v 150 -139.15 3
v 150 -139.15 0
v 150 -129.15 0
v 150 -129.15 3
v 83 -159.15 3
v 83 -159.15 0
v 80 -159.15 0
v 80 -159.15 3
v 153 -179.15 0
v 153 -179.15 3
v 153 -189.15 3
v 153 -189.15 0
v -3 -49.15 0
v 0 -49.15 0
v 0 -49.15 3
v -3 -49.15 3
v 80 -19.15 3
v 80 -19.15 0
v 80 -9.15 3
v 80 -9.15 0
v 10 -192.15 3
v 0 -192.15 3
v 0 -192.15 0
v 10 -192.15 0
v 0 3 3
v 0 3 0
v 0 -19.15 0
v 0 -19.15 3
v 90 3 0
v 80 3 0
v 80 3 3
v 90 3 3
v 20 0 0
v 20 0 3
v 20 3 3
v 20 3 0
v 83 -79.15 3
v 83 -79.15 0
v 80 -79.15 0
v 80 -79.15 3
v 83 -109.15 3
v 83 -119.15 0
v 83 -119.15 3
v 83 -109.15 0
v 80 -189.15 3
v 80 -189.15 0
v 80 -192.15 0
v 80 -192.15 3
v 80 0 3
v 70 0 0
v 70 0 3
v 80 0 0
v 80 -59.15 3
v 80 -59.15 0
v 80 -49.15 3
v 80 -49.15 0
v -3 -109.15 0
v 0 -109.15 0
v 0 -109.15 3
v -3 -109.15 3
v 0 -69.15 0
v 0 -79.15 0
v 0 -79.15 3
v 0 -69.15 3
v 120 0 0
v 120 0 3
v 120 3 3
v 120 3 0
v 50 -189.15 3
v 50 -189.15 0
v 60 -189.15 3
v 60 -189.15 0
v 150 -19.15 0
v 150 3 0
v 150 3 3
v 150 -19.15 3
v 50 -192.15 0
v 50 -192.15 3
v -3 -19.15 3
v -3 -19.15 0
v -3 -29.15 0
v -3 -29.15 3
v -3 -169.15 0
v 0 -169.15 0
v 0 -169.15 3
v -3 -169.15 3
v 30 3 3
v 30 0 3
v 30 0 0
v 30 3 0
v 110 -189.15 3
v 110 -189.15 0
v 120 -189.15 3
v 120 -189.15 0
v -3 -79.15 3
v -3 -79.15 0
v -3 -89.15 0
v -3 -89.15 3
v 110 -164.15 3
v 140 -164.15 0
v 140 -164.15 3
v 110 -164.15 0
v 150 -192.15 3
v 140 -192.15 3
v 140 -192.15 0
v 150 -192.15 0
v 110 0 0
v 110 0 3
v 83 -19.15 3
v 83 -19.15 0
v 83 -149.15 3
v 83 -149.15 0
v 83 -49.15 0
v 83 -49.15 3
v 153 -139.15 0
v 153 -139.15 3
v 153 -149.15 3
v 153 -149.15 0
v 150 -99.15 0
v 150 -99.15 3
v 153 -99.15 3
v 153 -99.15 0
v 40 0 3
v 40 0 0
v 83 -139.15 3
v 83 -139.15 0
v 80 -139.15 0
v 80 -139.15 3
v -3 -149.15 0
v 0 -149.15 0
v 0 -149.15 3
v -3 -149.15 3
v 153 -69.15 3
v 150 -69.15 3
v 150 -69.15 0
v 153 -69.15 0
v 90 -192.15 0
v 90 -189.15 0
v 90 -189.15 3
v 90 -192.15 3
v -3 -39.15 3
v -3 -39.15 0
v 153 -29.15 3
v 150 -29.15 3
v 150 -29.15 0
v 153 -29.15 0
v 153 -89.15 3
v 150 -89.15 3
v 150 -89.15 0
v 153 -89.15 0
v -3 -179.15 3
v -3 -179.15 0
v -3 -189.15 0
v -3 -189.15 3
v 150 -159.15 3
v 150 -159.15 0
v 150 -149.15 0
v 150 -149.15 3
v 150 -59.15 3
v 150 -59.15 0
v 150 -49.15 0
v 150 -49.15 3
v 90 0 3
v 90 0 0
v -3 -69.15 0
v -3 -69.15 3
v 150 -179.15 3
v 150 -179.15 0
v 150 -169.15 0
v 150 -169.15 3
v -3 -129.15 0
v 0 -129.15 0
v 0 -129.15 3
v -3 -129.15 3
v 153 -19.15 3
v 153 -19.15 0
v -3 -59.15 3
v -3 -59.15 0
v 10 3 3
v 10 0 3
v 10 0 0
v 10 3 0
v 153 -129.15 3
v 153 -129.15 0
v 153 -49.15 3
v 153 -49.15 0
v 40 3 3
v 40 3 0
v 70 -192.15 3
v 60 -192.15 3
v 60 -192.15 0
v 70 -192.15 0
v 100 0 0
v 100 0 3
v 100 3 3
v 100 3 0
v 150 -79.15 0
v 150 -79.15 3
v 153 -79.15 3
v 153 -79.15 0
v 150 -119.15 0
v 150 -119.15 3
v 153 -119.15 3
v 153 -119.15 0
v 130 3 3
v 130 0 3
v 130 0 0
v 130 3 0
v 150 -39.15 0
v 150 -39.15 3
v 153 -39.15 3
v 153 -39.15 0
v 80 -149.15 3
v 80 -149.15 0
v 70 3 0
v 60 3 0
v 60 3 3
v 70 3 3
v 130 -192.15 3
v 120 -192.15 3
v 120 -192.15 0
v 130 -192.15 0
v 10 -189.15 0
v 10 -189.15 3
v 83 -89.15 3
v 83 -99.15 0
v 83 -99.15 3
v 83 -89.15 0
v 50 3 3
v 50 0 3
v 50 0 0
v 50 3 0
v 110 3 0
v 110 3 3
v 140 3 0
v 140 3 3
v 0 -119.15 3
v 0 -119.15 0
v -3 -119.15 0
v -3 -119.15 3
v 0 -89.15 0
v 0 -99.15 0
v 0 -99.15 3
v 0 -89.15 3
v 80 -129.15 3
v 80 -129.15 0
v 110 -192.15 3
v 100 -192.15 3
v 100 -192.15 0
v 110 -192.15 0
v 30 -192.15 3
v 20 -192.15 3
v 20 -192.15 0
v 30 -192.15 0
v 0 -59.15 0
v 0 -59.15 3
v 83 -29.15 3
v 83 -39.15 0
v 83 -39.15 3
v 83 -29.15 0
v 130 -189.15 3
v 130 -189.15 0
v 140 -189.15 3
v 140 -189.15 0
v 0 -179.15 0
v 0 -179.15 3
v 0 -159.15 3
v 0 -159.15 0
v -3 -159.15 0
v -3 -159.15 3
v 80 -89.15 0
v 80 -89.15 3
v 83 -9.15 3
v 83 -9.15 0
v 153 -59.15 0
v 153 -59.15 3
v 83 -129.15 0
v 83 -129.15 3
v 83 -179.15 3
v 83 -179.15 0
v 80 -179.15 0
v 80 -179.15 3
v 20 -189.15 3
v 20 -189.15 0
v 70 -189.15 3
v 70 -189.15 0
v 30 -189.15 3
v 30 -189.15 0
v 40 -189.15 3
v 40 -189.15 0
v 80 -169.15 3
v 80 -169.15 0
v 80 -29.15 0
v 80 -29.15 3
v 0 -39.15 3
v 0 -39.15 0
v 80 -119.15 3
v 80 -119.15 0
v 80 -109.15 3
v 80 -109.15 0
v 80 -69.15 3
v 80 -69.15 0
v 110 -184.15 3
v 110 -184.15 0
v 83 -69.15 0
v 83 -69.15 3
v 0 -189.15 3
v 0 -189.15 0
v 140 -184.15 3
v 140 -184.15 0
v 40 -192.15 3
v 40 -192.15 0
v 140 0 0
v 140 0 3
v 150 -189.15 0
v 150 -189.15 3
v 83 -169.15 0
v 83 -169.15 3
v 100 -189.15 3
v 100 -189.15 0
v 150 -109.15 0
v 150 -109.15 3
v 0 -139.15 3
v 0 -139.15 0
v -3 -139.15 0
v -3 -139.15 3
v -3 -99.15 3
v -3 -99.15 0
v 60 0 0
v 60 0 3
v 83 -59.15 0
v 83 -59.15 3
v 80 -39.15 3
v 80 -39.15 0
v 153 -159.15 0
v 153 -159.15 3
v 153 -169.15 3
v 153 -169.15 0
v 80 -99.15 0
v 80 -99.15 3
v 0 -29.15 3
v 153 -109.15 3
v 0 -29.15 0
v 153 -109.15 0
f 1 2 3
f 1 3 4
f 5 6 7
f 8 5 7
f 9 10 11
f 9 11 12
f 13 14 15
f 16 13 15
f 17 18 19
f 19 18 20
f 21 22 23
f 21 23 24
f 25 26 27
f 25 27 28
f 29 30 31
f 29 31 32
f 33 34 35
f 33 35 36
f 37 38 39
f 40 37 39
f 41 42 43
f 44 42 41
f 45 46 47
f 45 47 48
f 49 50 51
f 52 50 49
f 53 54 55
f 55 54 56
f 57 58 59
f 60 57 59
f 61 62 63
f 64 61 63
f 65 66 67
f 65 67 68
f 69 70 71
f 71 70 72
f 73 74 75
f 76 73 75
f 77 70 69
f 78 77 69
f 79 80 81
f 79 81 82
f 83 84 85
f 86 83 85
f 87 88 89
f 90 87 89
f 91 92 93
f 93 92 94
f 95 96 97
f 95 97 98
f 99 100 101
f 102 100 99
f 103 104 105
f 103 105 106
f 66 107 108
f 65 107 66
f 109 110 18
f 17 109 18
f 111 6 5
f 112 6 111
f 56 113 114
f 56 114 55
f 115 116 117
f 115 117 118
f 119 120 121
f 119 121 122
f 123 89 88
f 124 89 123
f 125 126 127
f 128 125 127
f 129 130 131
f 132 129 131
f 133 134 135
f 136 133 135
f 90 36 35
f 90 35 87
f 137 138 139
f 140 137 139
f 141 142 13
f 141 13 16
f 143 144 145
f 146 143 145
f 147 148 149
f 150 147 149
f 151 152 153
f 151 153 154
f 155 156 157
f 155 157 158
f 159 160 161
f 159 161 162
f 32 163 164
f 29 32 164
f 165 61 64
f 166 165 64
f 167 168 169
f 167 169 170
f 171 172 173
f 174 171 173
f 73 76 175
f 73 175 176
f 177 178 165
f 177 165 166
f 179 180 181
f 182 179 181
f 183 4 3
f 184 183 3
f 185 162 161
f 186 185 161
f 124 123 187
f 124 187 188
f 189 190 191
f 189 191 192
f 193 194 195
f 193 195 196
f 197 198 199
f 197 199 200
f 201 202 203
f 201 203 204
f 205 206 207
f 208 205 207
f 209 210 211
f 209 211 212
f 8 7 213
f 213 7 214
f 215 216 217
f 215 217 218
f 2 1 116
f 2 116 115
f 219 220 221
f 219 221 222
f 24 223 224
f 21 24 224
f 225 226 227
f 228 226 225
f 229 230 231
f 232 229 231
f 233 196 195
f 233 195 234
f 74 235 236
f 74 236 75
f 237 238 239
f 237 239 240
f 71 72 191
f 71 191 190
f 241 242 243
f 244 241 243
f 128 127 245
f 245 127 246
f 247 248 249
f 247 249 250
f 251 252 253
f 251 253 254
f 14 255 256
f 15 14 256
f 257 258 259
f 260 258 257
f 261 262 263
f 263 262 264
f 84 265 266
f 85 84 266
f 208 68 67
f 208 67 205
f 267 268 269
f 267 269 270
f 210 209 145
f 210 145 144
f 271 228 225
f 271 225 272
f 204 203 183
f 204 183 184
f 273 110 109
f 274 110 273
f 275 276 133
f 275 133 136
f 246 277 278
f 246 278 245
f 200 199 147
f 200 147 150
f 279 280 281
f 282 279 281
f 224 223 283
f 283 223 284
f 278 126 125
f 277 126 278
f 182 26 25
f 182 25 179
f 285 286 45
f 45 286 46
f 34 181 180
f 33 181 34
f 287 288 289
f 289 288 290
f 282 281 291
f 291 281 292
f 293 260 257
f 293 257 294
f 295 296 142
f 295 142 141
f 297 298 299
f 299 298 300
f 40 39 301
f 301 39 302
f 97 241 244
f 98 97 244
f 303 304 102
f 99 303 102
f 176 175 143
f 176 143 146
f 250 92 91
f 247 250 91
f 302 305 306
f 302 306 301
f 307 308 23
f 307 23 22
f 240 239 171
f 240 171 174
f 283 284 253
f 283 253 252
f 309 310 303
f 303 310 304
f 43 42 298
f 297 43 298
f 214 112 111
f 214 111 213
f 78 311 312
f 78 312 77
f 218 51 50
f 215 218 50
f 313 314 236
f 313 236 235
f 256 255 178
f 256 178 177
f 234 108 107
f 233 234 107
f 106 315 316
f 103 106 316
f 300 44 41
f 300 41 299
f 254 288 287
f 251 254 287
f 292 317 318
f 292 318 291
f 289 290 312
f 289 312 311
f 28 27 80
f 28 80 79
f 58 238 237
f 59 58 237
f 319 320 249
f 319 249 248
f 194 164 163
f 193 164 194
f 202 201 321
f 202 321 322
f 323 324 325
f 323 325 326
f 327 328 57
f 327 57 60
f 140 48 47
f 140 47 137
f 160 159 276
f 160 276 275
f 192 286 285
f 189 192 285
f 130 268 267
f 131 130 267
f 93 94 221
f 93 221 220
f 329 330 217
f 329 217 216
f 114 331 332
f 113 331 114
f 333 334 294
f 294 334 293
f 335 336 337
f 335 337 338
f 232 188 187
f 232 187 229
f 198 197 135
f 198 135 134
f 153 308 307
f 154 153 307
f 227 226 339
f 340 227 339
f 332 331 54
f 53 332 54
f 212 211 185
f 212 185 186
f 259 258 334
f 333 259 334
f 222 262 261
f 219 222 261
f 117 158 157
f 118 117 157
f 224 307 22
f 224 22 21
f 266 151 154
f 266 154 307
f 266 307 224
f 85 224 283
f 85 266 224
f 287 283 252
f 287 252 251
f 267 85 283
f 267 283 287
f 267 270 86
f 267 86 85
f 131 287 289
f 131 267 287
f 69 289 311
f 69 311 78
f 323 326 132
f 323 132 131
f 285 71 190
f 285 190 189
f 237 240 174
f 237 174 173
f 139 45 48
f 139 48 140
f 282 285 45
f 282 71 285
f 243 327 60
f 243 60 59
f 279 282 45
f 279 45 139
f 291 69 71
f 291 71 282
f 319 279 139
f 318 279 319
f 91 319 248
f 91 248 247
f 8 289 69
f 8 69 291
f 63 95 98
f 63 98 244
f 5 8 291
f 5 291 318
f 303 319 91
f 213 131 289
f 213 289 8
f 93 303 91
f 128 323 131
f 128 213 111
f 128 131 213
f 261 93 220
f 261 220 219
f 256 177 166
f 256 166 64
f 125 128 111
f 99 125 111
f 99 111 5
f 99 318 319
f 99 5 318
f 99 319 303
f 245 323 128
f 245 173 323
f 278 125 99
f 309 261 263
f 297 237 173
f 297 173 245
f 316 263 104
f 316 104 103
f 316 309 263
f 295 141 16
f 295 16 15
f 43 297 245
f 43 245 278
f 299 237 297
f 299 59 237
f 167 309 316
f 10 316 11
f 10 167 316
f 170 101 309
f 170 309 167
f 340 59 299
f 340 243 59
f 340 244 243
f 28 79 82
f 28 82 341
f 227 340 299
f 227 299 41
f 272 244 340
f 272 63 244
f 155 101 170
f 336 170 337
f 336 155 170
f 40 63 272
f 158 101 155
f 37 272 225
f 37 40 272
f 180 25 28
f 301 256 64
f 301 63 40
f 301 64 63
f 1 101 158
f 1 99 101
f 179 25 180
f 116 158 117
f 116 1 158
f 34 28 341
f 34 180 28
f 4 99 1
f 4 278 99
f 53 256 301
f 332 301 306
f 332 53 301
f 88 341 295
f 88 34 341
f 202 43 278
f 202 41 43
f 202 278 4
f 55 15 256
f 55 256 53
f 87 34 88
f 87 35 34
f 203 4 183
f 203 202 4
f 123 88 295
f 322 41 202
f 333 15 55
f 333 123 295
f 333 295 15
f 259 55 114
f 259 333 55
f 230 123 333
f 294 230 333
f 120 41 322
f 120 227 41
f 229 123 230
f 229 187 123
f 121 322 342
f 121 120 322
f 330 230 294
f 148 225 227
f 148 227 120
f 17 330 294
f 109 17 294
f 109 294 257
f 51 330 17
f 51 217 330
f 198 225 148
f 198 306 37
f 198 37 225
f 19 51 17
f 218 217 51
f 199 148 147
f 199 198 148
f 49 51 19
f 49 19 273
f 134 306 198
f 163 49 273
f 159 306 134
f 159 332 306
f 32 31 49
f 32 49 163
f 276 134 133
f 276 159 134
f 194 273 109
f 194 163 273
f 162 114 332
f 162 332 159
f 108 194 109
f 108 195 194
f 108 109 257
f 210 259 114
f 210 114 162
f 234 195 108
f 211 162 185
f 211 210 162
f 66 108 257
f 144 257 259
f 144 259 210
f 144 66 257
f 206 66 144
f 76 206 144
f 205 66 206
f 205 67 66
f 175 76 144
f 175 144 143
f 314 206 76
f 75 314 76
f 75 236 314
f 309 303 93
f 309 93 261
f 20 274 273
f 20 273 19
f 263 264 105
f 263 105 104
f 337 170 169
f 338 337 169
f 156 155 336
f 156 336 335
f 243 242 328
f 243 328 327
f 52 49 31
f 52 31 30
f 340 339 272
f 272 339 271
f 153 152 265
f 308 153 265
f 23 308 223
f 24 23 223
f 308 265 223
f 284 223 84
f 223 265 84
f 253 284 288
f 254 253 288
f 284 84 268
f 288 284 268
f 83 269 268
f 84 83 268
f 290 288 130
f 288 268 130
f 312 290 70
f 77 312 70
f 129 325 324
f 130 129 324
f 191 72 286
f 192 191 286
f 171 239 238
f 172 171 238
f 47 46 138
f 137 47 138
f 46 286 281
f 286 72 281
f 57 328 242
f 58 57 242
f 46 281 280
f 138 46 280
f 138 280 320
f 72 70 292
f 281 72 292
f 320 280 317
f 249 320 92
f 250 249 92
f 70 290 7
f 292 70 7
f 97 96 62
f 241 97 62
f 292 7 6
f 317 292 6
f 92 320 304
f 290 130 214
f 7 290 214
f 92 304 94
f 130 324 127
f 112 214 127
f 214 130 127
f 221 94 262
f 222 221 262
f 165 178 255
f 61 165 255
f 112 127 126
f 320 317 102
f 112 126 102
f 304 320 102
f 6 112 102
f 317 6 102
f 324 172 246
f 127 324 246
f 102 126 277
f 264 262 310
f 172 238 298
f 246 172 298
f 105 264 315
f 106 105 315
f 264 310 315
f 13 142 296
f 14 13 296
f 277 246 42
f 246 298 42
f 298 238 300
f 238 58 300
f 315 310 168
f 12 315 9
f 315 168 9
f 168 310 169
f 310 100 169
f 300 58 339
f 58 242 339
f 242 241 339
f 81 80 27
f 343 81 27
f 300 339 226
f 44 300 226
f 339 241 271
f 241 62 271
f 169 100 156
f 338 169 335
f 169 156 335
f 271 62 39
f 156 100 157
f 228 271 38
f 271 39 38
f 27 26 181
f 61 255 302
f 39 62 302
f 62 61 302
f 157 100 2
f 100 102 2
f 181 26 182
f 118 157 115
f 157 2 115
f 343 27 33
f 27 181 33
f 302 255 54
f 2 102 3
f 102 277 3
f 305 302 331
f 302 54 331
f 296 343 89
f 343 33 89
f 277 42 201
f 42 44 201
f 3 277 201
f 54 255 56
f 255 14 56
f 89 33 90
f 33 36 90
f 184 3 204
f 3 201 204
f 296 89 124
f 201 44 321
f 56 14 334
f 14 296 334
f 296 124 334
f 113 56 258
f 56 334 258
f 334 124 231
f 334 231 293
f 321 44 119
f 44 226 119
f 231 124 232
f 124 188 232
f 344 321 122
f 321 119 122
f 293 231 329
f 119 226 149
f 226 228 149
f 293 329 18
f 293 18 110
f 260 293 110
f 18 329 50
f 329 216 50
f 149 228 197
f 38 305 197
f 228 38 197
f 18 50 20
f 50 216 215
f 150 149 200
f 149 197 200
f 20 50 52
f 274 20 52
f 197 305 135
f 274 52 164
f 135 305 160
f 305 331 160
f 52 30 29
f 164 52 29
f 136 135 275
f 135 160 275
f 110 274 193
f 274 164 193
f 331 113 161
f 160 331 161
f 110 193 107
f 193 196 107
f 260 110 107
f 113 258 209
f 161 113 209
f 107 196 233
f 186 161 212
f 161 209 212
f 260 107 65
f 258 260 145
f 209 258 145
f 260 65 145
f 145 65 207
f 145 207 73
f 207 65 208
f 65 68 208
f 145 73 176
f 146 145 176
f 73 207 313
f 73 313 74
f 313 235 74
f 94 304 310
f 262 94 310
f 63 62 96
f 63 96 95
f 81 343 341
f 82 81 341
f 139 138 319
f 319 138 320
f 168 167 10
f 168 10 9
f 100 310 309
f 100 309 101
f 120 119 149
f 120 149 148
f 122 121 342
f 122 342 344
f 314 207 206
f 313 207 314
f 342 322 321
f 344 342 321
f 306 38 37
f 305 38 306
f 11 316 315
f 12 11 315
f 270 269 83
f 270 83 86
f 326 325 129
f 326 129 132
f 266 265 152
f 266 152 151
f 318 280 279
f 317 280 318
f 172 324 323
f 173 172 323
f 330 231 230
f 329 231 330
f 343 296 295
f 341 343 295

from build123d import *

# Parameters (mm, degrees)
ESQUISSE1_W                = 150
ESQUISSE1_H                = 189.15
BOSS_EXTRU_1_DEPTH         = 3
ESQUISSE2_W                = 10
ESQUISSE2_H                = 3
BOSS_EXTRU_2_DEPTH         = 3
R_P_TITION_LIN_AIRE1_COUNT = 8
R_P_TITION_LIN_AIRE1_PITCH = 20
ESQUISSE3_W                = 10
ESQUISSE3_H                = 3
BOSS_EXTRU_3_DEPTH         = 3
R_P_TITION_LIN_AIRE2_COUNT = 8
R_P_TITION_LIN_AIRE2_PITCH = 20
ESQUISSE4_W                = 3
ESQUISSE4_H                = 10
BOSS_EXTRU_4_DEPTH         = 3
R_P_TITION_LIN_AIRE3_COUNT = 9
R_P_TITION_LIN_AIRE3_PITCH = 20
ESQUISSE5_W                = 3
ESQUISSE5_H                = 10
BOSS_EXTRU_5_DEPTH         = 3
R_P_TITION_LIN_AIRE4_COUNT = 9
R_P_TITION_LIN_AIRE4_PITCH = 20
ESQUISSE6_W                = 30
ESQUISSE6_H                = 20
ENL_V_MAT_EXTRU_1_DEPTH    = 4
ESQUISSE7_W                = 3
ESQUISSE7_H                = 10
ENL_V_MAT_EXTRU_2_DEPTH    = 4
R_P_TITION_LIN_AIRE5_COUNT = 9
R_P_TITION_LIN_AIRE5_PITCH = 20


with BuildPart() as part:
    # Esquisse1 → Boss.-Extru.1 (new body)
    with BuildSketch(Plane.XY):
        with Locations((75, -94.575)):
            Rectangle(ESQUISSE1_W, ESQUISSE1_H)
    extrude(amount=BOSS_EXTRU_1_DEPTH)

    # Esquisse2 → Boss.-Extru.2 (add)
    with BuildSketch(Plane(origin=(0, 0, 0), x_dir=(1, 0, 0), z_dir=(0, 1, 0))):
        with Locations((5, -1.5)):
            Rectangle(ESQUISSE2_W, ESQUISSE2_H)
    boss_extru_2 = extrude(amount=BOSS_EXTRU_2_DEPTH)

    # Répétition linéaire1: Boss.-Extru.2 ×8
    with Locations(*[(i * R_P_TITION_LIN_AIRE1_PITCH, 0, 0) for i in range(1, R_P_TITION_LIN_AIRE1_COUNT)]):
        add(boss_extru_2)

    # Esquisse3 → Boss.-Extru.3 (add)
    with BuildSketch(Plane.XZ.offset(189.15)):
        with Locations((5, 1.5)):
            Rectangle(ESQUISSE3_W, ESQUISSE3_H)
    boss_extru_3 = extrude(amount=BOSS_EXTRU_3_DEPTH)

    # Répétition linéaire2: Boss.-Extru.3 ×8
    with Locations(*[(i * R_P_TITION_LIN_AIRE2_PITCH, 0, 0) for i in range(1, R_P_TITION_LIN_AIRE2_COUNT)]):
        add(boss_extru_3)

    # Esquisse4 → Boss.-Extru.4 (add)
    with BuildSketch(Plane.ZY):
        with Locations((1.5, -184.15)):
            Rectangle(ESQUISSE4_W, ESQUISSE4_H)
    boss_extru_4 = extrude(amount=BOSS_EXTRU_4_DEPTH)

    # Répétition linéaire3: Boss.-Extru.4 ×9
    with Locations(*[(0, i * R_P_TITION_LIN_AIRE3_PITCH, 0) for i in range(1, R_P_TITION_LIN_AIRE3_COUNT)]):
        add(boss_extru_4)

    # Esquisse5 → Boss.-Extru.5 (add)
    with BuildSketch(Plane(origin=(150, 0, 0), x_dir=(0, 0, -1), z_dir=(1, 0, 0))):
        with Locations((-1.5, -184.15)):
            Rectangle(ESQUISSE5_W, ESQUISSE5_H)
    boss_extru_5 = extrude(amount=BOSS_EXTRU_5_DEPTH)

    # Répétition linéaire4: Boss.-Extru.5 ×9
    with Locations(*[(0, i * R_P_TITION_LIN_AIRE4_PITCH, 0) for i in range(1, R_P_TITION_LIN_AIRE4_COUNT)]):
        add(boss_extru_5)

    # Esquisse6 → Enlèv. mat.-Extru.1 (cut, through all)
    with BuildSketch(Plane(origin=(0, 0, 0), x_dir=(-1, 0, 0), z_dir=(0, 0, -1))):
        with Locations((-125, -174.15)):
            Rectangle(ESQUISSE6_W, ESQUISSE6_H)
    extrude(amount=-ENL_V_MAT_EXTRU_1_DEPTH, mode=Mode.SUBTRACT)

    # Esquisse7 → Enlèv. mat.-Extru.2 (cut, through all)
    with BuildSketch(Plane(origin=(0, 0, 0), x_dir=(-1, 0, 0), z_dir=(0, 0, -1))):
        with Locations((-81.5, -14.15)):
            Rectangle(ESQUISSE7_W, ESQUISSE7_H)
    enl_v_mat_extru_2 = extrude(amount=-ENL_V_MAT_EXTRU_2_DEPTH, mode=Mode.SUBTRACT)

    # Répétition linéaire5: Enlèv. mat.-Extru.2 ×9
    with Locations(*[(0, -i * R_P_TITION_LIN_AIRE5_PITCH, 0) for i in range(1, R_P_TITION_LIN_AIRE5_COUNT)]):
        add(enl_v_mat_extru_2, mode=Mode.SUBTRACT)


solid = part.part
